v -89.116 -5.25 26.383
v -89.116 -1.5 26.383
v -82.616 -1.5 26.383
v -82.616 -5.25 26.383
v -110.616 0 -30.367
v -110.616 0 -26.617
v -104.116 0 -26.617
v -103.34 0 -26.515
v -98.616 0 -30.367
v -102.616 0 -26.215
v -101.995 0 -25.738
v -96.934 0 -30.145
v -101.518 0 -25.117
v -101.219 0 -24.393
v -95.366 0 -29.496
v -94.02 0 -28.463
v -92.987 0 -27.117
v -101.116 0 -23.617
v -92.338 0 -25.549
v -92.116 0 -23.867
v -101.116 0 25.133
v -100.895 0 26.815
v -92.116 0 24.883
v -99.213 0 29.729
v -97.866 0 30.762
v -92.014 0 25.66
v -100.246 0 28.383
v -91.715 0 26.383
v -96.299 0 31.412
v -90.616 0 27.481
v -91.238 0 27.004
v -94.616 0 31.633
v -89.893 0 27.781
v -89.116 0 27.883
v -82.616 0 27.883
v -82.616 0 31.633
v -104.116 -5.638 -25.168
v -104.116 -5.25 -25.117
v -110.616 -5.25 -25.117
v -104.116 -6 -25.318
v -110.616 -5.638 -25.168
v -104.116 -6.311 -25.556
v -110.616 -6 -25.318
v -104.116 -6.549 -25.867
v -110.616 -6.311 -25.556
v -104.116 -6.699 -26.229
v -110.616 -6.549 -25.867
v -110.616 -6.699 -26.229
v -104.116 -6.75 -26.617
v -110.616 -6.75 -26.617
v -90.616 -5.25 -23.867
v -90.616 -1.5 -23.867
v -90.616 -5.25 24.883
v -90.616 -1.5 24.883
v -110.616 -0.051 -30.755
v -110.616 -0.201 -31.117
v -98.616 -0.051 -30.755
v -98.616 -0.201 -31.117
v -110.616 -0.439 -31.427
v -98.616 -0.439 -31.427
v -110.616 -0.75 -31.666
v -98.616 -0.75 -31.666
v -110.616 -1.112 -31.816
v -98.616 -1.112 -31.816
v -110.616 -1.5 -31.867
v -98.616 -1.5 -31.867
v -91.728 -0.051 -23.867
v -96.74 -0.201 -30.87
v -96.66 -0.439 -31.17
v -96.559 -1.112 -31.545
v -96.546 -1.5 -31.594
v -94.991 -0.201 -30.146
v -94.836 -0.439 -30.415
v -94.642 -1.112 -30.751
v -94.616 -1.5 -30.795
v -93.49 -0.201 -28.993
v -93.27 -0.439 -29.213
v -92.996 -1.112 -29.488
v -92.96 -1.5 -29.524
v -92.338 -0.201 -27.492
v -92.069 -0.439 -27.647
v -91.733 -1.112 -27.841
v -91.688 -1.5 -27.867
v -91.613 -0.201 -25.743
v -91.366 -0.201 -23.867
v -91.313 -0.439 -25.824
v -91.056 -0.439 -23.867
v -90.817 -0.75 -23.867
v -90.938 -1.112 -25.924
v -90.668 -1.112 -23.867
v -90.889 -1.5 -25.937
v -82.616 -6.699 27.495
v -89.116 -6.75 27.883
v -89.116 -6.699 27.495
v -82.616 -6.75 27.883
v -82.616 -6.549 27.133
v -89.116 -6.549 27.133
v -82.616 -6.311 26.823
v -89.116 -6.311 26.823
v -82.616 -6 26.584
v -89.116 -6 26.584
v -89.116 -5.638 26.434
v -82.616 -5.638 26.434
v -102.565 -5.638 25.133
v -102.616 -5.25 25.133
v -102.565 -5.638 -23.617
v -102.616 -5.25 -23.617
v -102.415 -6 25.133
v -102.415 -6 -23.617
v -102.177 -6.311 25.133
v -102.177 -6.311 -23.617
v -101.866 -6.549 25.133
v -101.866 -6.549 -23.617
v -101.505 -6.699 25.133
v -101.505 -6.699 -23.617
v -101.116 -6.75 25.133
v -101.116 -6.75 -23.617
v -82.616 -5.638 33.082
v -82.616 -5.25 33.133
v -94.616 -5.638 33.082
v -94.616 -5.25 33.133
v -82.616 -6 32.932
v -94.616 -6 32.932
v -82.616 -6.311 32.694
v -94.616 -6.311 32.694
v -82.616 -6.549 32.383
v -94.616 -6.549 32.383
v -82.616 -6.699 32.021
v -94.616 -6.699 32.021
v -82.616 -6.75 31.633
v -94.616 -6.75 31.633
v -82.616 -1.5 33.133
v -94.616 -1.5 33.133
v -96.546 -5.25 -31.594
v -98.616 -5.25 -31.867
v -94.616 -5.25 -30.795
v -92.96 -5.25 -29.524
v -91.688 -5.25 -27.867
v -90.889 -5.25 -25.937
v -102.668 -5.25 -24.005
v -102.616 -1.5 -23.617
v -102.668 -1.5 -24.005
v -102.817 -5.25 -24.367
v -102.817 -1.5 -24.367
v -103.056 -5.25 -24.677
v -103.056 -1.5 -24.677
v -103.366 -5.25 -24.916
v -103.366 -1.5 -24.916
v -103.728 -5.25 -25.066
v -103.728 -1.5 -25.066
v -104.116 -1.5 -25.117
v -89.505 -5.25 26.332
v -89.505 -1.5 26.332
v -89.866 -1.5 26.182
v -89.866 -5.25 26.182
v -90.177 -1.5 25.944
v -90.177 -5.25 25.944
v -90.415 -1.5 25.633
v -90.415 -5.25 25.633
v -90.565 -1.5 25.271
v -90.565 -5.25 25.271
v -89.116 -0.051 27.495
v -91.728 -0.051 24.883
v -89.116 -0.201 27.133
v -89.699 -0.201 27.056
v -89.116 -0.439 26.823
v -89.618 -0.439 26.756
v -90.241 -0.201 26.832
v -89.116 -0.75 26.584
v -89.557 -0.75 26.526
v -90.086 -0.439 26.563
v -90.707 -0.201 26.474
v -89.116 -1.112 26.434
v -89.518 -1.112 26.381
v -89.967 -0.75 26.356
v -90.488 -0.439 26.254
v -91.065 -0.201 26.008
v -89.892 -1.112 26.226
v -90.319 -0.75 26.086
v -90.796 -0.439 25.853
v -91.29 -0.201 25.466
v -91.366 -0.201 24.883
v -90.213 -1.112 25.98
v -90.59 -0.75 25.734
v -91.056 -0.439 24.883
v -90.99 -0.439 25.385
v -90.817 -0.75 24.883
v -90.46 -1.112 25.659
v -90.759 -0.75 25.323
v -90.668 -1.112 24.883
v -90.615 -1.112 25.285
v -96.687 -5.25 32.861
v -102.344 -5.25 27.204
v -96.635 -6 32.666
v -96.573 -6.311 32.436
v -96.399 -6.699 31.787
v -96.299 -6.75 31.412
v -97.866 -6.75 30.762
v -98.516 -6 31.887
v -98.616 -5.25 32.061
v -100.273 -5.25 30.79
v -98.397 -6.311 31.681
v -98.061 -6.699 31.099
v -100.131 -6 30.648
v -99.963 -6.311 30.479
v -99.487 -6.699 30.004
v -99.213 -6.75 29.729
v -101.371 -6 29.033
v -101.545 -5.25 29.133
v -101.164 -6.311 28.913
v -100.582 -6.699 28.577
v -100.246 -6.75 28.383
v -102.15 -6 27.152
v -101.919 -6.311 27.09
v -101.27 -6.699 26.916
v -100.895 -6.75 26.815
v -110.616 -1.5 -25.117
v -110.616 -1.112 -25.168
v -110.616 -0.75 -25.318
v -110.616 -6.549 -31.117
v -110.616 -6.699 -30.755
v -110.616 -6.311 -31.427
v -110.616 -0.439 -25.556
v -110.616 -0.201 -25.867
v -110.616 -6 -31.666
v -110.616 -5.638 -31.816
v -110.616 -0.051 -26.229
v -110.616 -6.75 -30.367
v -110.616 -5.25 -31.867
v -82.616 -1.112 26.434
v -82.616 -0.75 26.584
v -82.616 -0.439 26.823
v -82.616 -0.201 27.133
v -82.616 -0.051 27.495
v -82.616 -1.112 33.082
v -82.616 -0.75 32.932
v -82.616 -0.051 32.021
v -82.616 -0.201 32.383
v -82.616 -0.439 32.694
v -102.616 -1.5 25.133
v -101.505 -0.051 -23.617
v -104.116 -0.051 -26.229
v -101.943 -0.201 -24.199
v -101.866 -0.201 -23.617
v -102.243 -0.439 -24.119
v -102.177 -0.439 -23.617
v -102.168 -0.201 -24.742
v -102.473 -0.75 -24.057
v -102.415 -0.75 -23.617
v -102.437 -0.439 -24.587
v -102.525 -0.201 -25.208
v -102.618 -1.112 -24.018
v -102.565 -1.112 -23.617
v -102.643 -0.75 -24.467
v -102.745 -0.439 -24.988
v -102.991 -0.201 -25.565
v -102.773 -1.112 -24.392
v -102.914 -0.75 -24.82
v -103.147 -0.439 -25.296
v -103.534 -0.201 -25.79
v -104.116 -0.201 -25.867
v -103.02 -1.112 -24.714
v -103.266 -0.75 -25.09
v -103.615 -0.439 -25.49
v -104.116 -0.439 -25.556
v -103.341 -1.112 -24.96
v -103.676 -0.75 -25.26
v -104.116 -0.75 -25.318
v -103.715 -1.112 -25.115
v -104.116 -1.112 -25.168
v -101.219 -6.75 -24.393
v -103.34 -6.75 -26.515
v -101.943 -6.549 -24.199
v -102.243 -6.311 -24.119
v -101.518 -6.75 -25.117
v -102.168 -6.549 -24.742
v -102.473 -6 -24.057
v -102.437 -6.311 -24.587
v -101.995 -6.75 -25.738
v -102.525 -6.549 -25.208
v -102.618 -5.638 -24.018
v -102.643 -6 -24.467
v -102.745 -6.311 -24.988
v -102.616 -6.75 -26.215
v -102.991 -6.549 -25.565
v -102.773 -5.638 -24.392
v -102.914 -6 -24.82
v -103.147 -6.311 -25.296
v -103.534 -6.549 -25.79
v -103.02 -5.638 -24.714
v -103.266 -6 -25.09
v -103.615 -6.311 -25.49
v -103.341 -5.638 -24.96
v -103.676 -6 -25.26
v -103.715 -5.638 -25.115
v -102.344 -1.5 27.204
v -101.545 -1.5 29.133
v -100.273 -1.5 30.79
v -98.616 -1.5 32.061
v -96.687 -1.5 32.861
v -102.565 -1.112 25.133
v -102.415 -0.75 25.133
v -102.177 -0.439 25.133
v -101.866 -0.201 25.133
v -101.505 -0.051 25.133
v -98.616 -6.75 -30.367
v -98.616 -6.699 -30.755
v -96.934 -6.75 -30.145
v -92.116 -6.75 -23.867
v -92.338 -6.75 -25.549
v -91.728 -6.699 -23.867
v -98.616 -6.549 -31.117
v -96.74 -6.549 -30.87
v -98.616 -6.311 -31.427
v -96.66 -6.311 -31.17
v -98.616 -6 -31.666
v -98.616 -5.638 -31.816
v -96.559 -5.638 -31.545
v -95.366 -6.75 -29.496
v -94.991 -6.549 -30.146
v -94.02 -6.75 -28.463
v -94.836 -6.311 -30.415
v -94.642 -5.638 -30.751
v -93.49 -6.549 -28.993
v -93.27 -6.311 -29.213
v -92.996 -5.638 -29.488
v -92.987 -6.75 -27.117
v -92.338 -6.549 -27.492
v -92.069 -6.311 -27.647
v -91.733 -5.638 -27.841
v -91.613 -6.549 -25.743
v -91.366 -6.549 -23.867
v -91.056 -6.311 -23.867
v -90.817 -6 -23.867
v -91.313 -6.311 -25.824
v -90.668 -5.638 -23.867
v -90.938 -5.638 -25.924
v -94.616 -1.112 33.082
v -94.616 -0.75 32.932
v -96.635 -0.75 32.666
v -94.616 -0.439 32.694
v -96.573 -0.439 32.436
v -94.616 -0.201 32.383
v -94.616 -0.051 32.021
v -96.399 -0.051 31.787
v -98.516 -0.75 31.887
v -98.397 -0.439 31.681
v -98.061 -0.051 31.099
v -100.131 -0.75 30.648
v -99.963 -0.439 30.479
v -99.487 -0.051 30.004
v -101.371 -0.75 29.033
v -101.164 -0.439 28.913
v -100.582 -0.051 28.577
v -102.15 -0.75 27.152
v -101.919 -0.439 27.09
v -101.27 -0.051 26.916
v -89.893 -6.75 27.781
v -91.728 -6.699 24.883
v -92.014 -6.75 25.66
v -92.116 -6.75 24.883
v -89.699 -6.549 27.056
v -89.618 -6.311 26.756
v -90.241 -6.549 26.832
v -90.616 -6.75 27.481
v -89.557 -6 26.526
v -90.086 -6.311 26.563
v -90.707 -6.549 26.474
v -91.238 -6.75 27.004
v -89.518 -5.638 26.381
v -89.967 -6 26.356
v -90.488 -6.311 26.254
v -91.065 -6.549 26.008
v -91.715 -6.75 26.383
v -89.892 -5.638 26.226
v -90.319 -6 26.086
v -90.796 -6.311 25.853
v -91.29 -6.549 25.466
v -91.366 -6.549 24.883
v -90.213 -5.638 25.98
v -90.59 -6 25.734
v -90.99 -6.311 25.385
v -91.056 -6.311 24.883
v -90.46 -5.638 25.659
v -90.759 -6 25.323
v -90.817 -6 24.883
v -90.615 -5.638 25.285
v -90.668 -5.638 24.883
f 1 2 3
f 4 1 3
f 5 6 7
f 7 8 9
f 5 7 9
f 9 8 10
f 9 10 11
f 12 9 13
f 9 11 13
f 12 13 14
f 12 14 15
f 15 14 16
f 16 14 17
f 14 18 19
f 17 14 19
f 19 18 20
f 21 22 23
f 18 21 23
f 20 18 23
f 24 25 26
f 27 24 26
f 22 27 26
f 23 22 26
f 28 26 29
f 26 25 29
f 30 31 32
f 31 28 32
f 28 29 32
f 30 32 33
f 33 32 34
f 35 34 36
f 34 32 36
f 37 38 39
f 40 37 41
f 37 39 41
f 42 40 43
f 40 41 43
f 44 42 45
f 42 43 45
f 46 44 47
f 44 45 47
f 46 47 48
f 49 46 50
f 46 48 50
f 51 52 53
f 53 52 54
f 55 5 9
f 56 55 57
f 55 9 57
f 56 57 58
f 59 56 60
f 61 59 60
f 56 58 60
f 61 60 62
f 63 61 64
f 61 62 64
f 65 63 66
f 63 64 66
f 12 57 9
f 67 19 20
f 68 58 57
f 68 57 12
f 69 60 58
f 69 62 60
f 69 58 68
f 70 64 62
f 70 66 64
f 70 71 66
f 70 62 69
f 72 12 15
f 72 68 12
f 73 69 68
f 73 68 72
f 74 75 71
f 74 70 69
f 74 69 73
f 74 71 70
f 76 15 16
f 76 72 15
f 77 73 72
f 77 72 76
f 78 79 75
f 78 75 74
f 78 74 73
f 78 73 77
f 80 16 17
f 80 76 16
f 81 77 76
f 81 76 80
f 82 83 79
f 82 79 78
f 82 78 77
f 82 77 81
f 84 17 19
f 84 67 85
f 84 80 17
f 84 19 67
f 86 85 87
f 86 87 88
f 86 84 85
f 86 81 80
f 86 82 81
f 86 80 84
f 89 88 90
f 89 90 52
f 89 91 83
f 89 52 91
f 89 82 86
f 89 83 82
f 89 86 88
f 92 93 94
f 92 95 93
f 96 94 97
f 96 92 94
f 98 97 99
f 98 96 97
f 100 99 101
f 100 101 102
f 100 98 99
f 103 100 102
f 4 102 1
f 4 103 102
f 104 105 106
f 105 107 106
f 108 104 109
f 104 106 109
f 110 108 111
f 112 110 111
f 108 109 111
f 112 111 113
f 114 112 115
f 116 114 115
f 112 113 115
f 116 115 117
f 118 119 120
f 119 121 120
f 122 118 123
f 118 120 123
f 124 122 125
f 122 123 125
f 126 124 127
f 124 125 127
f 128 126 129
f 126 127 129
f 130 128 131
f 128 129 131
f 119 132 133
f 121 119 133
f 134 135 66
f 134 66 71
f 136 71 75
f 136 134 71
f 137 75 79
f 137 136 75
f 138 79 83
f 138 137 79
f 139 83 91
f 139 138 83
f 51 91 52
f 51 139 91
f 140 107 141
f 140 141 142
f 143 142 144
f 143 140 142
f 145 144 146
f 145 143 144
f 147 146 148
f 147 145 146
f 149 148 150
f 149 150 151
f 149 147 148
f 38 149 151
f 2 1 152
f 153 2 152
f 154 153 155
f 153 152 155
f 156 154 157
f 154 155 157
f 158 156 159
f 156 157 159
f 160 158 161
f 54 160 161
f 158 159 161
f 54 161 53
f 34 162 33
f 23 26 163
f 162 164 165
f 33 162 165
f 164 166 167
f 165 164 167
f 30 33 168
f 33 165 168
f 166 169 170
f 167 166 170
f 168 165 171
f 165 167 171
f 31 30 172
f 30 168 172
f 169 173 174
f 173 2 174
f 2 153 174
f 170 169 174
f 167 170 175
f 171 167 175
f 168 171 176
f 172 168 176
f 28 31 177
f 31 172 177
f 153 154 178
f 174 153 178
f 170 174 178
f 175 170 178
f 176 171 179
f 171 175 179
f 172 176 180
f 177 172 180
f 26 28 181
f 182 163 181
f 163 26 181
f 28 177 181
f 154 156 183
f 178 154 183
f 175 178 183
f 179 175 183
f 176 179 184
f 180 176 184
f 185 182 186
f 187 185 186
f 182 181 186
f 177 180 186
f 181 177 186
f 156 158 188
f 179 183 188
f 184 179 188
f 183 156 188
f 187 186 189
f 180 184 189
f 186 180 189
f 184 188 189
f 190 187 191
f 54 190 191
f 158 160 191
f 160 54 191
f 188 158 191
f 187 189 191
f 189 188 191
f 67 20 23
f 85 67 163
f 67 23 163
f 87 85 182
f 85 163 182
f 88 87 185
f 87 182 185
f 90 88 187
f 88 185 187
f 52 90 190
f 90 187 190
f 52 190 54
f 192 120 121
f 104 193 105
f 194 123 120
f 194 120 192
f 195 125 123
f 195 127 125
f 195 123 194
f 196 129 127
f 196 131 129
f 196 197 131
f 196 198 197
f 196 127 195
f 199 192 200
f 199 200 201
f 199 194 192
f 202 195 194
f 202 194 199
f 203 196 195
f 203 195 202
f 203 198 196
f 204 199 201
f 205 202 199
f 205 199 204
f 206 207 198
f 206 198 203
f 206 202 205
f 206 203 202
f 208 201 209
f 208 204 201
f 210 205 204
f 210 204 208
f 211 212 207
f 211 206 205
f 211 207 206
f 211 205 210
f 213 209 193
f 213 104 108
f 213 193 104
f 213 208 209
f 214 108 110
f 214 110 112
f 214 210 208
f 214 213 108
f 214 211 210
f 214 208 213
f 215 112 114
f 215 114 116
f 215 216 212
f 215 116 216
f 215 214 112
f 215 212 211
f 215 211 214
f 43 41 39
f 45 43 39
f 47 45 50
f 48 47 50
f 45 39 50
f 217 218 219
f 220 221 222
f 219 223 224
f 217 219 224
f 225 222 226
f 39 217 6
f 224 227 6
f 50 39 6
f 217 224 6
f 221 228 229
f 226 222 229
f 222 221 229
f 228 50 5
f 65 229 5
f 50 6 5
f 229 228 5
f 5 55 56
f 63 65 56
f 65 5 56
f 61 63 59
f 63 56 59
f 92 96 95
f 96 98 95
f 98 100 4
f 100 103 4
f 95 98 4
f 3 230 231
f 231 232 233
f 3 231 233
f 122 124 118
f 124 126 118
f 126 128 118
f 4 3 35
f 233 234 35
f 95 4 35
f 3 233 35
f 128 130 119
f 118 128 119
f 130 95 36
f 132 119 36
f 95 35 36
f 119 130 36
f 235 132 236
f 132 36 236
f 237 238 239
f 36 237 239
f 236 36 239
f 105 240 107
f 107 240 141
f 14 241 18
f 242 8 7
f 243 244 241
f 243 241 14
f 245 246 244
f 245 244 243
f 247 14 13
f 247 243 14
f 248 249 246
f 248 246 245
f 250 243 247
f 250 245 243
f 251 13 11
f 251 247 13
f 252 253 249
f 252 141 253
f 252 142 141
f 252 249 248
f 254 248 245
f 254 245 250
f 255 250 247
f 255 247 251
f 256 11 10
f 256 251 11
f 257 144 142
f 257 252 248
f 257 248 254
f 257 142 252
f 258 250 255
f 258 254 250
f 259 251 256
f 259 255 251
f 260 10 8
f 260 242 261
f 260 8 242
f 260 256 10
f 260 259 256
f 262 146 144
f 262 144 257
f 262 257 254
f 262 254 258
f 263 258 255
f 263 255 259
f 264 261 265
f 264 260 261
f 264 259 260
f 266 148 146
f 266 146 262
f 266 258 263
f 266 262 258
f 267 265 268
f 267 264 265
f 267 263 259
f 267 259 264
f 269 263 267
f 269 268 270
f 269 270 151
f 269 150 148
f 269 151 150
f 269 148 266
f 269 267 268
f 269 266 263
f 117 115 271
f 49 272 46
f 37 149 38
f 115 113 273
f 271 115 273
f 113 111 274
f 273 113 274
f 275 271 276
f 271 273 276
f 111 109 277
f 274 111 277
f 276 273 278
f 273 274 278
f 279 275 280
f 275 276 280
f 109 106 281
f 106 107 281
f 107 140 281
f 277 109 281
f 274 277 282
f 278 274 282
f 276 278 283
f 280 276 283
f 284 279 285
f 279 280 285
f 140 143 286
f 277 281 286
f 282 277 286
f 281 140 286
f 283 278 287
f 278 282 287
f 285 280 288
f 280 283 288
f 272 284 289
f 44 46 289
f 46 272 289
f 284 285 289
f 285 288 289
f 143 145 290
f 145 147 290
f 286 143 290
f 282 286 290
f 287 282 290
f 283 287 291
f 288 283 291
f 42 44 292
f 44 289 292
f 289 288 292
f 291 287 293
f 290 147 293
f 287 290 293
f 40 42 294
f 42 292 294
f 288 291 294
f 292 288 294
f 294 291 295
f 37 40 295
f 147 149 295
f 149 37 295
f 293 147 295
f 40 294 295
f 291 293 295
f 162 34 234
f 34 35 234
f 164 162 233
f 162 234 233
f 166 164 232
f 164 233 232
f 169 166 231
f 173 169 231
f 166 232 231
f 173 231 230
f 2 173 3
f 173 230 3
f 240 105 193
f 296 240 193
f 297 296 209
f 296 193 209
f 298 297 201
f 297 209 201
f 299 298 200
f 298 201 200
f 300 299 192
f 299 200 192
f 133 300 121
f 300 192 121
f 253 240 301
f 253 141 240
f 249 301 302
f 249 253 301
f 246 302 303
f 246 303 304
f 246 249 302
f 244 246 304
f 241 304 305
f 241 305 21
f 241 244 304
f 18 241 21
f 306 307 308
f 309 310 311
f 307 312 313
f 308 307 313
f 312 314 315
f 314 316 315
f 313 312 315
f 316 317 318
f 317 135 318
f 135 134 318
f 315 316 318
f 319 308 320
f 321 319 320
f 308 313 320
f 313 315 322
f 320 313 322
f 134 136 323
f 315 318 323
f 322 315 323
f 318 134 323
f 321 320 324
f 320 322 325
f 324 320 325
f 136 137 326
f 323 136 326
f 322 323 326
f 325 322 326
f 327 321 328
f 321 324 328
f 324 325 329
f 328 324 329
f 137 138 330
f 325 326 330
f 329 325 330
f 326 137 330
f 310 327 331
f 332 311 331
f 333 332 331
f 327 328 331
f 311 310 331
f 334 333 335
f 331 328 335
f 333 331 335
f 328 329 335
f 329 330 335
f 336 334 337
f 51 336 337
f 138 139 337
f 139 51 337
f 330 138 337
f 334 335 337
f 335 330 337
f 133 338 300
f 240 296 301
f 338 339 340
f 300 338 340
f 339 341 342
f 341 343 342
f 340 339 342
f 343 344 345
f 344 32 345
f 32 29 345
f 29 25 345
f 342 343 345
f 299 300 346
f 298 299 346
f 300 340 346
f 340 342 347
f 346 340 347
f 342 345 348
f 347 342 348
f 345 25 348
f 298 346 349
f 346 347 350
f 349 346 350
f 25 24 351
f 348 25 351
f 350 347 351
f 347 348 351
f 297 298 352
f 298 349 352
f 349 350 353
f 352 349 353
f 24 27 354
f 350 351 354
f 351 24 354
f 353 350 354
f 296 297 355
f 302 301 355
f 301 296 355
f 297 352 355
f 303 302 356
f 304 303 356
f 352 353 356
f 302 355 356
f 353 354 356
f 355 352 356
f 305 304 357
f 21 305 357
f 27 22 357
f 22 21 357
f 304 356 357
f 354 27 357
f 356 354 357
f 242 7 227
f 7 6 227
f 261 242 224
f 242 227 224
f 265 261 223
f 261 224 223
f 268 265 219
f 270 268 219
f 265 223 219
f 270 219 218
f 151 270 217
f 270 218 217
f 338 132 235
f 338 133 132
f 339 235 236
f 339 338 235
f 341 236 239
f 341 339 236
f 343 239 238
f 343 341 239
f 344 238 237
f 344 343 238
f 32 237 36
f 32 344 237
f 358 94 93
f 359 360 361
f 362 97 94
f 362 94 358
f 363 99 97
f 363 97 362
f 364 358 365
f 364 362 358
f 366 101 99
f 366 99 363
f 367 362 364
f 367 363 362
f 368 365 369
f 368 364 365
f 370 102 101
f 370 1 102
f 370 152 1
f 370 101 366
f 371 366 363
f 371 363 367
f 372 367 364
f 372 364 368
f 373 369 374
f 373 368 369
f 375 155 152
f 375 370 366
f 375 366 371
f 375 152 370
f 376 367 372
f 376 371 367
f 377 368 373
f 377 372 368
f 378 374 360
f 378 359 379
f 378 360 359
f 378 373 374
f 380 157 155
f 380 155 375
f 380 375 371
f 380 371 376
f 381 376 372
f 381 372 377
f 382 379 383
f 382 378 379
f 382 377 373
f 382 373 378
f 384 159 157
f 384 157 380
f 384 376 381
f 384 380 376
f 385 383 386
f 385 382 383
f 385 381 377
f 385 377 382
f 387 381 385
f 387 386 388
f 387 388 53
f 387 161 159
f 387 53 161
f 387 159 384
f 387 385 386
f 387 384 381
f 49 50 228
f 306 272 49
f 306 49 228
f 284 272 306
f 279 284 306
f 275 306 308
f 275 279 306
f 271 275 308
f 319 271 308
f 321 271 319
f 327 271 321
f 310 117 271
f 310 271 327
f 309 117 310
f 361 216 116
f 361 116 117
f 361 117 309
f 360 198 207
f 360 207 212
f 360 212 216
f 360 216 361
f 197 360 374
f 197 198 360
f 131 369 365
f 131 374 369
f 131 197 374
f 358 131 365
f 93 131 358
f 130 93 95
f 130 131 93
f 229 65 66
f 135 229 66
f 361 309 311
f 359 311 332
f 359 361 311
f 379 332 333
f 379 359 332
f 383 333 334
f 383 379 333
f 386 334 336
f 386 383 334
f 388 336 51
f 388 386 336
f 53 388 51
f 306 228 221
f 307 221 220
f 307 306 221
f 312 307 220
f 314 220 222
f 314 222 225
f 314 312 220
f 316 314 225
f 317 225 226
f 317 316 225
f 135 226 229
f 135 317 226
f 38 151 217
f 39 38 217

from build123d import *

# Parameters (mm, degrees)
F1_DEPTH = 6.75
F2_R     = 8
F3_R     = 1.5


with BuildPart() as f1:
    # F0 (on Front) → F1 (new body)
    with BuildSketch(Plane.XZ):
        Polygon((-90.6164456464, 33.1331632659), (-102.6164456464, 33.1331632659), (-102.6164456464, 26.3831632659), (-102.6164456464, -25.1168367341), (-110.6164456464, -25.1168367341), (-110.6164456464, -31.8668367341), (-102.6164456464, -31.8668367341), (-90.6164456464, -31.8668367341), (-90.6164456464, -25.1168367341), (-90.6164456464, 26.3831632659), (-82.6164456464, 26.3831632659), (-82.6164456464, 33.1331632659), align=None)
    extrude(amount=F1_DEPTH)

    # F2
    f2_edges = [f1.edges().sort_by_distance(p)[0] for p in [
        (-102.616446, -3.375, 33.133163),
        (-90.616446, -3.375, -31.866837),
    ]]
    fillet(f2_edges, radius=F2_R)

    # F3
    f3_edges = [f1.edges().sort_by_distance(p)[0] for p in [
        (-102.616446, 0, 0.008163),
        (-106.616446, 0, -25.116837),
        (-102.616446, -6.75, 0.008163),
        (-106.616446, -6.75, -25.116837),
        (-102.616446, -3.375, -25.116837),
        (-104.616446, -6.75, -31.866837),
        (-104.616446, 0, -31.866837),
        (-90.616446, -3.375, 26.383163),
        (-100.2733, 0, 30.790018),
        (-88.616446, 0, 33.133163),
        (-86.616446, 0, 26.383163),
        (-92.959591, 0, -29.523691),
        (-90.616446, 0, 1.258163),
        (-100.2733, -6.75, 30.790018),
        (-88.616446, -6.75, 33.133163),
        (-86.616446, -6.75, 26.383163),
        (-92.959591, -6.75, -29.523691),
        (-90.616446, -6.75, 1.258163),
    ]]
    fillet(f3_edges, radius=F3_R)


solid = f1.part
